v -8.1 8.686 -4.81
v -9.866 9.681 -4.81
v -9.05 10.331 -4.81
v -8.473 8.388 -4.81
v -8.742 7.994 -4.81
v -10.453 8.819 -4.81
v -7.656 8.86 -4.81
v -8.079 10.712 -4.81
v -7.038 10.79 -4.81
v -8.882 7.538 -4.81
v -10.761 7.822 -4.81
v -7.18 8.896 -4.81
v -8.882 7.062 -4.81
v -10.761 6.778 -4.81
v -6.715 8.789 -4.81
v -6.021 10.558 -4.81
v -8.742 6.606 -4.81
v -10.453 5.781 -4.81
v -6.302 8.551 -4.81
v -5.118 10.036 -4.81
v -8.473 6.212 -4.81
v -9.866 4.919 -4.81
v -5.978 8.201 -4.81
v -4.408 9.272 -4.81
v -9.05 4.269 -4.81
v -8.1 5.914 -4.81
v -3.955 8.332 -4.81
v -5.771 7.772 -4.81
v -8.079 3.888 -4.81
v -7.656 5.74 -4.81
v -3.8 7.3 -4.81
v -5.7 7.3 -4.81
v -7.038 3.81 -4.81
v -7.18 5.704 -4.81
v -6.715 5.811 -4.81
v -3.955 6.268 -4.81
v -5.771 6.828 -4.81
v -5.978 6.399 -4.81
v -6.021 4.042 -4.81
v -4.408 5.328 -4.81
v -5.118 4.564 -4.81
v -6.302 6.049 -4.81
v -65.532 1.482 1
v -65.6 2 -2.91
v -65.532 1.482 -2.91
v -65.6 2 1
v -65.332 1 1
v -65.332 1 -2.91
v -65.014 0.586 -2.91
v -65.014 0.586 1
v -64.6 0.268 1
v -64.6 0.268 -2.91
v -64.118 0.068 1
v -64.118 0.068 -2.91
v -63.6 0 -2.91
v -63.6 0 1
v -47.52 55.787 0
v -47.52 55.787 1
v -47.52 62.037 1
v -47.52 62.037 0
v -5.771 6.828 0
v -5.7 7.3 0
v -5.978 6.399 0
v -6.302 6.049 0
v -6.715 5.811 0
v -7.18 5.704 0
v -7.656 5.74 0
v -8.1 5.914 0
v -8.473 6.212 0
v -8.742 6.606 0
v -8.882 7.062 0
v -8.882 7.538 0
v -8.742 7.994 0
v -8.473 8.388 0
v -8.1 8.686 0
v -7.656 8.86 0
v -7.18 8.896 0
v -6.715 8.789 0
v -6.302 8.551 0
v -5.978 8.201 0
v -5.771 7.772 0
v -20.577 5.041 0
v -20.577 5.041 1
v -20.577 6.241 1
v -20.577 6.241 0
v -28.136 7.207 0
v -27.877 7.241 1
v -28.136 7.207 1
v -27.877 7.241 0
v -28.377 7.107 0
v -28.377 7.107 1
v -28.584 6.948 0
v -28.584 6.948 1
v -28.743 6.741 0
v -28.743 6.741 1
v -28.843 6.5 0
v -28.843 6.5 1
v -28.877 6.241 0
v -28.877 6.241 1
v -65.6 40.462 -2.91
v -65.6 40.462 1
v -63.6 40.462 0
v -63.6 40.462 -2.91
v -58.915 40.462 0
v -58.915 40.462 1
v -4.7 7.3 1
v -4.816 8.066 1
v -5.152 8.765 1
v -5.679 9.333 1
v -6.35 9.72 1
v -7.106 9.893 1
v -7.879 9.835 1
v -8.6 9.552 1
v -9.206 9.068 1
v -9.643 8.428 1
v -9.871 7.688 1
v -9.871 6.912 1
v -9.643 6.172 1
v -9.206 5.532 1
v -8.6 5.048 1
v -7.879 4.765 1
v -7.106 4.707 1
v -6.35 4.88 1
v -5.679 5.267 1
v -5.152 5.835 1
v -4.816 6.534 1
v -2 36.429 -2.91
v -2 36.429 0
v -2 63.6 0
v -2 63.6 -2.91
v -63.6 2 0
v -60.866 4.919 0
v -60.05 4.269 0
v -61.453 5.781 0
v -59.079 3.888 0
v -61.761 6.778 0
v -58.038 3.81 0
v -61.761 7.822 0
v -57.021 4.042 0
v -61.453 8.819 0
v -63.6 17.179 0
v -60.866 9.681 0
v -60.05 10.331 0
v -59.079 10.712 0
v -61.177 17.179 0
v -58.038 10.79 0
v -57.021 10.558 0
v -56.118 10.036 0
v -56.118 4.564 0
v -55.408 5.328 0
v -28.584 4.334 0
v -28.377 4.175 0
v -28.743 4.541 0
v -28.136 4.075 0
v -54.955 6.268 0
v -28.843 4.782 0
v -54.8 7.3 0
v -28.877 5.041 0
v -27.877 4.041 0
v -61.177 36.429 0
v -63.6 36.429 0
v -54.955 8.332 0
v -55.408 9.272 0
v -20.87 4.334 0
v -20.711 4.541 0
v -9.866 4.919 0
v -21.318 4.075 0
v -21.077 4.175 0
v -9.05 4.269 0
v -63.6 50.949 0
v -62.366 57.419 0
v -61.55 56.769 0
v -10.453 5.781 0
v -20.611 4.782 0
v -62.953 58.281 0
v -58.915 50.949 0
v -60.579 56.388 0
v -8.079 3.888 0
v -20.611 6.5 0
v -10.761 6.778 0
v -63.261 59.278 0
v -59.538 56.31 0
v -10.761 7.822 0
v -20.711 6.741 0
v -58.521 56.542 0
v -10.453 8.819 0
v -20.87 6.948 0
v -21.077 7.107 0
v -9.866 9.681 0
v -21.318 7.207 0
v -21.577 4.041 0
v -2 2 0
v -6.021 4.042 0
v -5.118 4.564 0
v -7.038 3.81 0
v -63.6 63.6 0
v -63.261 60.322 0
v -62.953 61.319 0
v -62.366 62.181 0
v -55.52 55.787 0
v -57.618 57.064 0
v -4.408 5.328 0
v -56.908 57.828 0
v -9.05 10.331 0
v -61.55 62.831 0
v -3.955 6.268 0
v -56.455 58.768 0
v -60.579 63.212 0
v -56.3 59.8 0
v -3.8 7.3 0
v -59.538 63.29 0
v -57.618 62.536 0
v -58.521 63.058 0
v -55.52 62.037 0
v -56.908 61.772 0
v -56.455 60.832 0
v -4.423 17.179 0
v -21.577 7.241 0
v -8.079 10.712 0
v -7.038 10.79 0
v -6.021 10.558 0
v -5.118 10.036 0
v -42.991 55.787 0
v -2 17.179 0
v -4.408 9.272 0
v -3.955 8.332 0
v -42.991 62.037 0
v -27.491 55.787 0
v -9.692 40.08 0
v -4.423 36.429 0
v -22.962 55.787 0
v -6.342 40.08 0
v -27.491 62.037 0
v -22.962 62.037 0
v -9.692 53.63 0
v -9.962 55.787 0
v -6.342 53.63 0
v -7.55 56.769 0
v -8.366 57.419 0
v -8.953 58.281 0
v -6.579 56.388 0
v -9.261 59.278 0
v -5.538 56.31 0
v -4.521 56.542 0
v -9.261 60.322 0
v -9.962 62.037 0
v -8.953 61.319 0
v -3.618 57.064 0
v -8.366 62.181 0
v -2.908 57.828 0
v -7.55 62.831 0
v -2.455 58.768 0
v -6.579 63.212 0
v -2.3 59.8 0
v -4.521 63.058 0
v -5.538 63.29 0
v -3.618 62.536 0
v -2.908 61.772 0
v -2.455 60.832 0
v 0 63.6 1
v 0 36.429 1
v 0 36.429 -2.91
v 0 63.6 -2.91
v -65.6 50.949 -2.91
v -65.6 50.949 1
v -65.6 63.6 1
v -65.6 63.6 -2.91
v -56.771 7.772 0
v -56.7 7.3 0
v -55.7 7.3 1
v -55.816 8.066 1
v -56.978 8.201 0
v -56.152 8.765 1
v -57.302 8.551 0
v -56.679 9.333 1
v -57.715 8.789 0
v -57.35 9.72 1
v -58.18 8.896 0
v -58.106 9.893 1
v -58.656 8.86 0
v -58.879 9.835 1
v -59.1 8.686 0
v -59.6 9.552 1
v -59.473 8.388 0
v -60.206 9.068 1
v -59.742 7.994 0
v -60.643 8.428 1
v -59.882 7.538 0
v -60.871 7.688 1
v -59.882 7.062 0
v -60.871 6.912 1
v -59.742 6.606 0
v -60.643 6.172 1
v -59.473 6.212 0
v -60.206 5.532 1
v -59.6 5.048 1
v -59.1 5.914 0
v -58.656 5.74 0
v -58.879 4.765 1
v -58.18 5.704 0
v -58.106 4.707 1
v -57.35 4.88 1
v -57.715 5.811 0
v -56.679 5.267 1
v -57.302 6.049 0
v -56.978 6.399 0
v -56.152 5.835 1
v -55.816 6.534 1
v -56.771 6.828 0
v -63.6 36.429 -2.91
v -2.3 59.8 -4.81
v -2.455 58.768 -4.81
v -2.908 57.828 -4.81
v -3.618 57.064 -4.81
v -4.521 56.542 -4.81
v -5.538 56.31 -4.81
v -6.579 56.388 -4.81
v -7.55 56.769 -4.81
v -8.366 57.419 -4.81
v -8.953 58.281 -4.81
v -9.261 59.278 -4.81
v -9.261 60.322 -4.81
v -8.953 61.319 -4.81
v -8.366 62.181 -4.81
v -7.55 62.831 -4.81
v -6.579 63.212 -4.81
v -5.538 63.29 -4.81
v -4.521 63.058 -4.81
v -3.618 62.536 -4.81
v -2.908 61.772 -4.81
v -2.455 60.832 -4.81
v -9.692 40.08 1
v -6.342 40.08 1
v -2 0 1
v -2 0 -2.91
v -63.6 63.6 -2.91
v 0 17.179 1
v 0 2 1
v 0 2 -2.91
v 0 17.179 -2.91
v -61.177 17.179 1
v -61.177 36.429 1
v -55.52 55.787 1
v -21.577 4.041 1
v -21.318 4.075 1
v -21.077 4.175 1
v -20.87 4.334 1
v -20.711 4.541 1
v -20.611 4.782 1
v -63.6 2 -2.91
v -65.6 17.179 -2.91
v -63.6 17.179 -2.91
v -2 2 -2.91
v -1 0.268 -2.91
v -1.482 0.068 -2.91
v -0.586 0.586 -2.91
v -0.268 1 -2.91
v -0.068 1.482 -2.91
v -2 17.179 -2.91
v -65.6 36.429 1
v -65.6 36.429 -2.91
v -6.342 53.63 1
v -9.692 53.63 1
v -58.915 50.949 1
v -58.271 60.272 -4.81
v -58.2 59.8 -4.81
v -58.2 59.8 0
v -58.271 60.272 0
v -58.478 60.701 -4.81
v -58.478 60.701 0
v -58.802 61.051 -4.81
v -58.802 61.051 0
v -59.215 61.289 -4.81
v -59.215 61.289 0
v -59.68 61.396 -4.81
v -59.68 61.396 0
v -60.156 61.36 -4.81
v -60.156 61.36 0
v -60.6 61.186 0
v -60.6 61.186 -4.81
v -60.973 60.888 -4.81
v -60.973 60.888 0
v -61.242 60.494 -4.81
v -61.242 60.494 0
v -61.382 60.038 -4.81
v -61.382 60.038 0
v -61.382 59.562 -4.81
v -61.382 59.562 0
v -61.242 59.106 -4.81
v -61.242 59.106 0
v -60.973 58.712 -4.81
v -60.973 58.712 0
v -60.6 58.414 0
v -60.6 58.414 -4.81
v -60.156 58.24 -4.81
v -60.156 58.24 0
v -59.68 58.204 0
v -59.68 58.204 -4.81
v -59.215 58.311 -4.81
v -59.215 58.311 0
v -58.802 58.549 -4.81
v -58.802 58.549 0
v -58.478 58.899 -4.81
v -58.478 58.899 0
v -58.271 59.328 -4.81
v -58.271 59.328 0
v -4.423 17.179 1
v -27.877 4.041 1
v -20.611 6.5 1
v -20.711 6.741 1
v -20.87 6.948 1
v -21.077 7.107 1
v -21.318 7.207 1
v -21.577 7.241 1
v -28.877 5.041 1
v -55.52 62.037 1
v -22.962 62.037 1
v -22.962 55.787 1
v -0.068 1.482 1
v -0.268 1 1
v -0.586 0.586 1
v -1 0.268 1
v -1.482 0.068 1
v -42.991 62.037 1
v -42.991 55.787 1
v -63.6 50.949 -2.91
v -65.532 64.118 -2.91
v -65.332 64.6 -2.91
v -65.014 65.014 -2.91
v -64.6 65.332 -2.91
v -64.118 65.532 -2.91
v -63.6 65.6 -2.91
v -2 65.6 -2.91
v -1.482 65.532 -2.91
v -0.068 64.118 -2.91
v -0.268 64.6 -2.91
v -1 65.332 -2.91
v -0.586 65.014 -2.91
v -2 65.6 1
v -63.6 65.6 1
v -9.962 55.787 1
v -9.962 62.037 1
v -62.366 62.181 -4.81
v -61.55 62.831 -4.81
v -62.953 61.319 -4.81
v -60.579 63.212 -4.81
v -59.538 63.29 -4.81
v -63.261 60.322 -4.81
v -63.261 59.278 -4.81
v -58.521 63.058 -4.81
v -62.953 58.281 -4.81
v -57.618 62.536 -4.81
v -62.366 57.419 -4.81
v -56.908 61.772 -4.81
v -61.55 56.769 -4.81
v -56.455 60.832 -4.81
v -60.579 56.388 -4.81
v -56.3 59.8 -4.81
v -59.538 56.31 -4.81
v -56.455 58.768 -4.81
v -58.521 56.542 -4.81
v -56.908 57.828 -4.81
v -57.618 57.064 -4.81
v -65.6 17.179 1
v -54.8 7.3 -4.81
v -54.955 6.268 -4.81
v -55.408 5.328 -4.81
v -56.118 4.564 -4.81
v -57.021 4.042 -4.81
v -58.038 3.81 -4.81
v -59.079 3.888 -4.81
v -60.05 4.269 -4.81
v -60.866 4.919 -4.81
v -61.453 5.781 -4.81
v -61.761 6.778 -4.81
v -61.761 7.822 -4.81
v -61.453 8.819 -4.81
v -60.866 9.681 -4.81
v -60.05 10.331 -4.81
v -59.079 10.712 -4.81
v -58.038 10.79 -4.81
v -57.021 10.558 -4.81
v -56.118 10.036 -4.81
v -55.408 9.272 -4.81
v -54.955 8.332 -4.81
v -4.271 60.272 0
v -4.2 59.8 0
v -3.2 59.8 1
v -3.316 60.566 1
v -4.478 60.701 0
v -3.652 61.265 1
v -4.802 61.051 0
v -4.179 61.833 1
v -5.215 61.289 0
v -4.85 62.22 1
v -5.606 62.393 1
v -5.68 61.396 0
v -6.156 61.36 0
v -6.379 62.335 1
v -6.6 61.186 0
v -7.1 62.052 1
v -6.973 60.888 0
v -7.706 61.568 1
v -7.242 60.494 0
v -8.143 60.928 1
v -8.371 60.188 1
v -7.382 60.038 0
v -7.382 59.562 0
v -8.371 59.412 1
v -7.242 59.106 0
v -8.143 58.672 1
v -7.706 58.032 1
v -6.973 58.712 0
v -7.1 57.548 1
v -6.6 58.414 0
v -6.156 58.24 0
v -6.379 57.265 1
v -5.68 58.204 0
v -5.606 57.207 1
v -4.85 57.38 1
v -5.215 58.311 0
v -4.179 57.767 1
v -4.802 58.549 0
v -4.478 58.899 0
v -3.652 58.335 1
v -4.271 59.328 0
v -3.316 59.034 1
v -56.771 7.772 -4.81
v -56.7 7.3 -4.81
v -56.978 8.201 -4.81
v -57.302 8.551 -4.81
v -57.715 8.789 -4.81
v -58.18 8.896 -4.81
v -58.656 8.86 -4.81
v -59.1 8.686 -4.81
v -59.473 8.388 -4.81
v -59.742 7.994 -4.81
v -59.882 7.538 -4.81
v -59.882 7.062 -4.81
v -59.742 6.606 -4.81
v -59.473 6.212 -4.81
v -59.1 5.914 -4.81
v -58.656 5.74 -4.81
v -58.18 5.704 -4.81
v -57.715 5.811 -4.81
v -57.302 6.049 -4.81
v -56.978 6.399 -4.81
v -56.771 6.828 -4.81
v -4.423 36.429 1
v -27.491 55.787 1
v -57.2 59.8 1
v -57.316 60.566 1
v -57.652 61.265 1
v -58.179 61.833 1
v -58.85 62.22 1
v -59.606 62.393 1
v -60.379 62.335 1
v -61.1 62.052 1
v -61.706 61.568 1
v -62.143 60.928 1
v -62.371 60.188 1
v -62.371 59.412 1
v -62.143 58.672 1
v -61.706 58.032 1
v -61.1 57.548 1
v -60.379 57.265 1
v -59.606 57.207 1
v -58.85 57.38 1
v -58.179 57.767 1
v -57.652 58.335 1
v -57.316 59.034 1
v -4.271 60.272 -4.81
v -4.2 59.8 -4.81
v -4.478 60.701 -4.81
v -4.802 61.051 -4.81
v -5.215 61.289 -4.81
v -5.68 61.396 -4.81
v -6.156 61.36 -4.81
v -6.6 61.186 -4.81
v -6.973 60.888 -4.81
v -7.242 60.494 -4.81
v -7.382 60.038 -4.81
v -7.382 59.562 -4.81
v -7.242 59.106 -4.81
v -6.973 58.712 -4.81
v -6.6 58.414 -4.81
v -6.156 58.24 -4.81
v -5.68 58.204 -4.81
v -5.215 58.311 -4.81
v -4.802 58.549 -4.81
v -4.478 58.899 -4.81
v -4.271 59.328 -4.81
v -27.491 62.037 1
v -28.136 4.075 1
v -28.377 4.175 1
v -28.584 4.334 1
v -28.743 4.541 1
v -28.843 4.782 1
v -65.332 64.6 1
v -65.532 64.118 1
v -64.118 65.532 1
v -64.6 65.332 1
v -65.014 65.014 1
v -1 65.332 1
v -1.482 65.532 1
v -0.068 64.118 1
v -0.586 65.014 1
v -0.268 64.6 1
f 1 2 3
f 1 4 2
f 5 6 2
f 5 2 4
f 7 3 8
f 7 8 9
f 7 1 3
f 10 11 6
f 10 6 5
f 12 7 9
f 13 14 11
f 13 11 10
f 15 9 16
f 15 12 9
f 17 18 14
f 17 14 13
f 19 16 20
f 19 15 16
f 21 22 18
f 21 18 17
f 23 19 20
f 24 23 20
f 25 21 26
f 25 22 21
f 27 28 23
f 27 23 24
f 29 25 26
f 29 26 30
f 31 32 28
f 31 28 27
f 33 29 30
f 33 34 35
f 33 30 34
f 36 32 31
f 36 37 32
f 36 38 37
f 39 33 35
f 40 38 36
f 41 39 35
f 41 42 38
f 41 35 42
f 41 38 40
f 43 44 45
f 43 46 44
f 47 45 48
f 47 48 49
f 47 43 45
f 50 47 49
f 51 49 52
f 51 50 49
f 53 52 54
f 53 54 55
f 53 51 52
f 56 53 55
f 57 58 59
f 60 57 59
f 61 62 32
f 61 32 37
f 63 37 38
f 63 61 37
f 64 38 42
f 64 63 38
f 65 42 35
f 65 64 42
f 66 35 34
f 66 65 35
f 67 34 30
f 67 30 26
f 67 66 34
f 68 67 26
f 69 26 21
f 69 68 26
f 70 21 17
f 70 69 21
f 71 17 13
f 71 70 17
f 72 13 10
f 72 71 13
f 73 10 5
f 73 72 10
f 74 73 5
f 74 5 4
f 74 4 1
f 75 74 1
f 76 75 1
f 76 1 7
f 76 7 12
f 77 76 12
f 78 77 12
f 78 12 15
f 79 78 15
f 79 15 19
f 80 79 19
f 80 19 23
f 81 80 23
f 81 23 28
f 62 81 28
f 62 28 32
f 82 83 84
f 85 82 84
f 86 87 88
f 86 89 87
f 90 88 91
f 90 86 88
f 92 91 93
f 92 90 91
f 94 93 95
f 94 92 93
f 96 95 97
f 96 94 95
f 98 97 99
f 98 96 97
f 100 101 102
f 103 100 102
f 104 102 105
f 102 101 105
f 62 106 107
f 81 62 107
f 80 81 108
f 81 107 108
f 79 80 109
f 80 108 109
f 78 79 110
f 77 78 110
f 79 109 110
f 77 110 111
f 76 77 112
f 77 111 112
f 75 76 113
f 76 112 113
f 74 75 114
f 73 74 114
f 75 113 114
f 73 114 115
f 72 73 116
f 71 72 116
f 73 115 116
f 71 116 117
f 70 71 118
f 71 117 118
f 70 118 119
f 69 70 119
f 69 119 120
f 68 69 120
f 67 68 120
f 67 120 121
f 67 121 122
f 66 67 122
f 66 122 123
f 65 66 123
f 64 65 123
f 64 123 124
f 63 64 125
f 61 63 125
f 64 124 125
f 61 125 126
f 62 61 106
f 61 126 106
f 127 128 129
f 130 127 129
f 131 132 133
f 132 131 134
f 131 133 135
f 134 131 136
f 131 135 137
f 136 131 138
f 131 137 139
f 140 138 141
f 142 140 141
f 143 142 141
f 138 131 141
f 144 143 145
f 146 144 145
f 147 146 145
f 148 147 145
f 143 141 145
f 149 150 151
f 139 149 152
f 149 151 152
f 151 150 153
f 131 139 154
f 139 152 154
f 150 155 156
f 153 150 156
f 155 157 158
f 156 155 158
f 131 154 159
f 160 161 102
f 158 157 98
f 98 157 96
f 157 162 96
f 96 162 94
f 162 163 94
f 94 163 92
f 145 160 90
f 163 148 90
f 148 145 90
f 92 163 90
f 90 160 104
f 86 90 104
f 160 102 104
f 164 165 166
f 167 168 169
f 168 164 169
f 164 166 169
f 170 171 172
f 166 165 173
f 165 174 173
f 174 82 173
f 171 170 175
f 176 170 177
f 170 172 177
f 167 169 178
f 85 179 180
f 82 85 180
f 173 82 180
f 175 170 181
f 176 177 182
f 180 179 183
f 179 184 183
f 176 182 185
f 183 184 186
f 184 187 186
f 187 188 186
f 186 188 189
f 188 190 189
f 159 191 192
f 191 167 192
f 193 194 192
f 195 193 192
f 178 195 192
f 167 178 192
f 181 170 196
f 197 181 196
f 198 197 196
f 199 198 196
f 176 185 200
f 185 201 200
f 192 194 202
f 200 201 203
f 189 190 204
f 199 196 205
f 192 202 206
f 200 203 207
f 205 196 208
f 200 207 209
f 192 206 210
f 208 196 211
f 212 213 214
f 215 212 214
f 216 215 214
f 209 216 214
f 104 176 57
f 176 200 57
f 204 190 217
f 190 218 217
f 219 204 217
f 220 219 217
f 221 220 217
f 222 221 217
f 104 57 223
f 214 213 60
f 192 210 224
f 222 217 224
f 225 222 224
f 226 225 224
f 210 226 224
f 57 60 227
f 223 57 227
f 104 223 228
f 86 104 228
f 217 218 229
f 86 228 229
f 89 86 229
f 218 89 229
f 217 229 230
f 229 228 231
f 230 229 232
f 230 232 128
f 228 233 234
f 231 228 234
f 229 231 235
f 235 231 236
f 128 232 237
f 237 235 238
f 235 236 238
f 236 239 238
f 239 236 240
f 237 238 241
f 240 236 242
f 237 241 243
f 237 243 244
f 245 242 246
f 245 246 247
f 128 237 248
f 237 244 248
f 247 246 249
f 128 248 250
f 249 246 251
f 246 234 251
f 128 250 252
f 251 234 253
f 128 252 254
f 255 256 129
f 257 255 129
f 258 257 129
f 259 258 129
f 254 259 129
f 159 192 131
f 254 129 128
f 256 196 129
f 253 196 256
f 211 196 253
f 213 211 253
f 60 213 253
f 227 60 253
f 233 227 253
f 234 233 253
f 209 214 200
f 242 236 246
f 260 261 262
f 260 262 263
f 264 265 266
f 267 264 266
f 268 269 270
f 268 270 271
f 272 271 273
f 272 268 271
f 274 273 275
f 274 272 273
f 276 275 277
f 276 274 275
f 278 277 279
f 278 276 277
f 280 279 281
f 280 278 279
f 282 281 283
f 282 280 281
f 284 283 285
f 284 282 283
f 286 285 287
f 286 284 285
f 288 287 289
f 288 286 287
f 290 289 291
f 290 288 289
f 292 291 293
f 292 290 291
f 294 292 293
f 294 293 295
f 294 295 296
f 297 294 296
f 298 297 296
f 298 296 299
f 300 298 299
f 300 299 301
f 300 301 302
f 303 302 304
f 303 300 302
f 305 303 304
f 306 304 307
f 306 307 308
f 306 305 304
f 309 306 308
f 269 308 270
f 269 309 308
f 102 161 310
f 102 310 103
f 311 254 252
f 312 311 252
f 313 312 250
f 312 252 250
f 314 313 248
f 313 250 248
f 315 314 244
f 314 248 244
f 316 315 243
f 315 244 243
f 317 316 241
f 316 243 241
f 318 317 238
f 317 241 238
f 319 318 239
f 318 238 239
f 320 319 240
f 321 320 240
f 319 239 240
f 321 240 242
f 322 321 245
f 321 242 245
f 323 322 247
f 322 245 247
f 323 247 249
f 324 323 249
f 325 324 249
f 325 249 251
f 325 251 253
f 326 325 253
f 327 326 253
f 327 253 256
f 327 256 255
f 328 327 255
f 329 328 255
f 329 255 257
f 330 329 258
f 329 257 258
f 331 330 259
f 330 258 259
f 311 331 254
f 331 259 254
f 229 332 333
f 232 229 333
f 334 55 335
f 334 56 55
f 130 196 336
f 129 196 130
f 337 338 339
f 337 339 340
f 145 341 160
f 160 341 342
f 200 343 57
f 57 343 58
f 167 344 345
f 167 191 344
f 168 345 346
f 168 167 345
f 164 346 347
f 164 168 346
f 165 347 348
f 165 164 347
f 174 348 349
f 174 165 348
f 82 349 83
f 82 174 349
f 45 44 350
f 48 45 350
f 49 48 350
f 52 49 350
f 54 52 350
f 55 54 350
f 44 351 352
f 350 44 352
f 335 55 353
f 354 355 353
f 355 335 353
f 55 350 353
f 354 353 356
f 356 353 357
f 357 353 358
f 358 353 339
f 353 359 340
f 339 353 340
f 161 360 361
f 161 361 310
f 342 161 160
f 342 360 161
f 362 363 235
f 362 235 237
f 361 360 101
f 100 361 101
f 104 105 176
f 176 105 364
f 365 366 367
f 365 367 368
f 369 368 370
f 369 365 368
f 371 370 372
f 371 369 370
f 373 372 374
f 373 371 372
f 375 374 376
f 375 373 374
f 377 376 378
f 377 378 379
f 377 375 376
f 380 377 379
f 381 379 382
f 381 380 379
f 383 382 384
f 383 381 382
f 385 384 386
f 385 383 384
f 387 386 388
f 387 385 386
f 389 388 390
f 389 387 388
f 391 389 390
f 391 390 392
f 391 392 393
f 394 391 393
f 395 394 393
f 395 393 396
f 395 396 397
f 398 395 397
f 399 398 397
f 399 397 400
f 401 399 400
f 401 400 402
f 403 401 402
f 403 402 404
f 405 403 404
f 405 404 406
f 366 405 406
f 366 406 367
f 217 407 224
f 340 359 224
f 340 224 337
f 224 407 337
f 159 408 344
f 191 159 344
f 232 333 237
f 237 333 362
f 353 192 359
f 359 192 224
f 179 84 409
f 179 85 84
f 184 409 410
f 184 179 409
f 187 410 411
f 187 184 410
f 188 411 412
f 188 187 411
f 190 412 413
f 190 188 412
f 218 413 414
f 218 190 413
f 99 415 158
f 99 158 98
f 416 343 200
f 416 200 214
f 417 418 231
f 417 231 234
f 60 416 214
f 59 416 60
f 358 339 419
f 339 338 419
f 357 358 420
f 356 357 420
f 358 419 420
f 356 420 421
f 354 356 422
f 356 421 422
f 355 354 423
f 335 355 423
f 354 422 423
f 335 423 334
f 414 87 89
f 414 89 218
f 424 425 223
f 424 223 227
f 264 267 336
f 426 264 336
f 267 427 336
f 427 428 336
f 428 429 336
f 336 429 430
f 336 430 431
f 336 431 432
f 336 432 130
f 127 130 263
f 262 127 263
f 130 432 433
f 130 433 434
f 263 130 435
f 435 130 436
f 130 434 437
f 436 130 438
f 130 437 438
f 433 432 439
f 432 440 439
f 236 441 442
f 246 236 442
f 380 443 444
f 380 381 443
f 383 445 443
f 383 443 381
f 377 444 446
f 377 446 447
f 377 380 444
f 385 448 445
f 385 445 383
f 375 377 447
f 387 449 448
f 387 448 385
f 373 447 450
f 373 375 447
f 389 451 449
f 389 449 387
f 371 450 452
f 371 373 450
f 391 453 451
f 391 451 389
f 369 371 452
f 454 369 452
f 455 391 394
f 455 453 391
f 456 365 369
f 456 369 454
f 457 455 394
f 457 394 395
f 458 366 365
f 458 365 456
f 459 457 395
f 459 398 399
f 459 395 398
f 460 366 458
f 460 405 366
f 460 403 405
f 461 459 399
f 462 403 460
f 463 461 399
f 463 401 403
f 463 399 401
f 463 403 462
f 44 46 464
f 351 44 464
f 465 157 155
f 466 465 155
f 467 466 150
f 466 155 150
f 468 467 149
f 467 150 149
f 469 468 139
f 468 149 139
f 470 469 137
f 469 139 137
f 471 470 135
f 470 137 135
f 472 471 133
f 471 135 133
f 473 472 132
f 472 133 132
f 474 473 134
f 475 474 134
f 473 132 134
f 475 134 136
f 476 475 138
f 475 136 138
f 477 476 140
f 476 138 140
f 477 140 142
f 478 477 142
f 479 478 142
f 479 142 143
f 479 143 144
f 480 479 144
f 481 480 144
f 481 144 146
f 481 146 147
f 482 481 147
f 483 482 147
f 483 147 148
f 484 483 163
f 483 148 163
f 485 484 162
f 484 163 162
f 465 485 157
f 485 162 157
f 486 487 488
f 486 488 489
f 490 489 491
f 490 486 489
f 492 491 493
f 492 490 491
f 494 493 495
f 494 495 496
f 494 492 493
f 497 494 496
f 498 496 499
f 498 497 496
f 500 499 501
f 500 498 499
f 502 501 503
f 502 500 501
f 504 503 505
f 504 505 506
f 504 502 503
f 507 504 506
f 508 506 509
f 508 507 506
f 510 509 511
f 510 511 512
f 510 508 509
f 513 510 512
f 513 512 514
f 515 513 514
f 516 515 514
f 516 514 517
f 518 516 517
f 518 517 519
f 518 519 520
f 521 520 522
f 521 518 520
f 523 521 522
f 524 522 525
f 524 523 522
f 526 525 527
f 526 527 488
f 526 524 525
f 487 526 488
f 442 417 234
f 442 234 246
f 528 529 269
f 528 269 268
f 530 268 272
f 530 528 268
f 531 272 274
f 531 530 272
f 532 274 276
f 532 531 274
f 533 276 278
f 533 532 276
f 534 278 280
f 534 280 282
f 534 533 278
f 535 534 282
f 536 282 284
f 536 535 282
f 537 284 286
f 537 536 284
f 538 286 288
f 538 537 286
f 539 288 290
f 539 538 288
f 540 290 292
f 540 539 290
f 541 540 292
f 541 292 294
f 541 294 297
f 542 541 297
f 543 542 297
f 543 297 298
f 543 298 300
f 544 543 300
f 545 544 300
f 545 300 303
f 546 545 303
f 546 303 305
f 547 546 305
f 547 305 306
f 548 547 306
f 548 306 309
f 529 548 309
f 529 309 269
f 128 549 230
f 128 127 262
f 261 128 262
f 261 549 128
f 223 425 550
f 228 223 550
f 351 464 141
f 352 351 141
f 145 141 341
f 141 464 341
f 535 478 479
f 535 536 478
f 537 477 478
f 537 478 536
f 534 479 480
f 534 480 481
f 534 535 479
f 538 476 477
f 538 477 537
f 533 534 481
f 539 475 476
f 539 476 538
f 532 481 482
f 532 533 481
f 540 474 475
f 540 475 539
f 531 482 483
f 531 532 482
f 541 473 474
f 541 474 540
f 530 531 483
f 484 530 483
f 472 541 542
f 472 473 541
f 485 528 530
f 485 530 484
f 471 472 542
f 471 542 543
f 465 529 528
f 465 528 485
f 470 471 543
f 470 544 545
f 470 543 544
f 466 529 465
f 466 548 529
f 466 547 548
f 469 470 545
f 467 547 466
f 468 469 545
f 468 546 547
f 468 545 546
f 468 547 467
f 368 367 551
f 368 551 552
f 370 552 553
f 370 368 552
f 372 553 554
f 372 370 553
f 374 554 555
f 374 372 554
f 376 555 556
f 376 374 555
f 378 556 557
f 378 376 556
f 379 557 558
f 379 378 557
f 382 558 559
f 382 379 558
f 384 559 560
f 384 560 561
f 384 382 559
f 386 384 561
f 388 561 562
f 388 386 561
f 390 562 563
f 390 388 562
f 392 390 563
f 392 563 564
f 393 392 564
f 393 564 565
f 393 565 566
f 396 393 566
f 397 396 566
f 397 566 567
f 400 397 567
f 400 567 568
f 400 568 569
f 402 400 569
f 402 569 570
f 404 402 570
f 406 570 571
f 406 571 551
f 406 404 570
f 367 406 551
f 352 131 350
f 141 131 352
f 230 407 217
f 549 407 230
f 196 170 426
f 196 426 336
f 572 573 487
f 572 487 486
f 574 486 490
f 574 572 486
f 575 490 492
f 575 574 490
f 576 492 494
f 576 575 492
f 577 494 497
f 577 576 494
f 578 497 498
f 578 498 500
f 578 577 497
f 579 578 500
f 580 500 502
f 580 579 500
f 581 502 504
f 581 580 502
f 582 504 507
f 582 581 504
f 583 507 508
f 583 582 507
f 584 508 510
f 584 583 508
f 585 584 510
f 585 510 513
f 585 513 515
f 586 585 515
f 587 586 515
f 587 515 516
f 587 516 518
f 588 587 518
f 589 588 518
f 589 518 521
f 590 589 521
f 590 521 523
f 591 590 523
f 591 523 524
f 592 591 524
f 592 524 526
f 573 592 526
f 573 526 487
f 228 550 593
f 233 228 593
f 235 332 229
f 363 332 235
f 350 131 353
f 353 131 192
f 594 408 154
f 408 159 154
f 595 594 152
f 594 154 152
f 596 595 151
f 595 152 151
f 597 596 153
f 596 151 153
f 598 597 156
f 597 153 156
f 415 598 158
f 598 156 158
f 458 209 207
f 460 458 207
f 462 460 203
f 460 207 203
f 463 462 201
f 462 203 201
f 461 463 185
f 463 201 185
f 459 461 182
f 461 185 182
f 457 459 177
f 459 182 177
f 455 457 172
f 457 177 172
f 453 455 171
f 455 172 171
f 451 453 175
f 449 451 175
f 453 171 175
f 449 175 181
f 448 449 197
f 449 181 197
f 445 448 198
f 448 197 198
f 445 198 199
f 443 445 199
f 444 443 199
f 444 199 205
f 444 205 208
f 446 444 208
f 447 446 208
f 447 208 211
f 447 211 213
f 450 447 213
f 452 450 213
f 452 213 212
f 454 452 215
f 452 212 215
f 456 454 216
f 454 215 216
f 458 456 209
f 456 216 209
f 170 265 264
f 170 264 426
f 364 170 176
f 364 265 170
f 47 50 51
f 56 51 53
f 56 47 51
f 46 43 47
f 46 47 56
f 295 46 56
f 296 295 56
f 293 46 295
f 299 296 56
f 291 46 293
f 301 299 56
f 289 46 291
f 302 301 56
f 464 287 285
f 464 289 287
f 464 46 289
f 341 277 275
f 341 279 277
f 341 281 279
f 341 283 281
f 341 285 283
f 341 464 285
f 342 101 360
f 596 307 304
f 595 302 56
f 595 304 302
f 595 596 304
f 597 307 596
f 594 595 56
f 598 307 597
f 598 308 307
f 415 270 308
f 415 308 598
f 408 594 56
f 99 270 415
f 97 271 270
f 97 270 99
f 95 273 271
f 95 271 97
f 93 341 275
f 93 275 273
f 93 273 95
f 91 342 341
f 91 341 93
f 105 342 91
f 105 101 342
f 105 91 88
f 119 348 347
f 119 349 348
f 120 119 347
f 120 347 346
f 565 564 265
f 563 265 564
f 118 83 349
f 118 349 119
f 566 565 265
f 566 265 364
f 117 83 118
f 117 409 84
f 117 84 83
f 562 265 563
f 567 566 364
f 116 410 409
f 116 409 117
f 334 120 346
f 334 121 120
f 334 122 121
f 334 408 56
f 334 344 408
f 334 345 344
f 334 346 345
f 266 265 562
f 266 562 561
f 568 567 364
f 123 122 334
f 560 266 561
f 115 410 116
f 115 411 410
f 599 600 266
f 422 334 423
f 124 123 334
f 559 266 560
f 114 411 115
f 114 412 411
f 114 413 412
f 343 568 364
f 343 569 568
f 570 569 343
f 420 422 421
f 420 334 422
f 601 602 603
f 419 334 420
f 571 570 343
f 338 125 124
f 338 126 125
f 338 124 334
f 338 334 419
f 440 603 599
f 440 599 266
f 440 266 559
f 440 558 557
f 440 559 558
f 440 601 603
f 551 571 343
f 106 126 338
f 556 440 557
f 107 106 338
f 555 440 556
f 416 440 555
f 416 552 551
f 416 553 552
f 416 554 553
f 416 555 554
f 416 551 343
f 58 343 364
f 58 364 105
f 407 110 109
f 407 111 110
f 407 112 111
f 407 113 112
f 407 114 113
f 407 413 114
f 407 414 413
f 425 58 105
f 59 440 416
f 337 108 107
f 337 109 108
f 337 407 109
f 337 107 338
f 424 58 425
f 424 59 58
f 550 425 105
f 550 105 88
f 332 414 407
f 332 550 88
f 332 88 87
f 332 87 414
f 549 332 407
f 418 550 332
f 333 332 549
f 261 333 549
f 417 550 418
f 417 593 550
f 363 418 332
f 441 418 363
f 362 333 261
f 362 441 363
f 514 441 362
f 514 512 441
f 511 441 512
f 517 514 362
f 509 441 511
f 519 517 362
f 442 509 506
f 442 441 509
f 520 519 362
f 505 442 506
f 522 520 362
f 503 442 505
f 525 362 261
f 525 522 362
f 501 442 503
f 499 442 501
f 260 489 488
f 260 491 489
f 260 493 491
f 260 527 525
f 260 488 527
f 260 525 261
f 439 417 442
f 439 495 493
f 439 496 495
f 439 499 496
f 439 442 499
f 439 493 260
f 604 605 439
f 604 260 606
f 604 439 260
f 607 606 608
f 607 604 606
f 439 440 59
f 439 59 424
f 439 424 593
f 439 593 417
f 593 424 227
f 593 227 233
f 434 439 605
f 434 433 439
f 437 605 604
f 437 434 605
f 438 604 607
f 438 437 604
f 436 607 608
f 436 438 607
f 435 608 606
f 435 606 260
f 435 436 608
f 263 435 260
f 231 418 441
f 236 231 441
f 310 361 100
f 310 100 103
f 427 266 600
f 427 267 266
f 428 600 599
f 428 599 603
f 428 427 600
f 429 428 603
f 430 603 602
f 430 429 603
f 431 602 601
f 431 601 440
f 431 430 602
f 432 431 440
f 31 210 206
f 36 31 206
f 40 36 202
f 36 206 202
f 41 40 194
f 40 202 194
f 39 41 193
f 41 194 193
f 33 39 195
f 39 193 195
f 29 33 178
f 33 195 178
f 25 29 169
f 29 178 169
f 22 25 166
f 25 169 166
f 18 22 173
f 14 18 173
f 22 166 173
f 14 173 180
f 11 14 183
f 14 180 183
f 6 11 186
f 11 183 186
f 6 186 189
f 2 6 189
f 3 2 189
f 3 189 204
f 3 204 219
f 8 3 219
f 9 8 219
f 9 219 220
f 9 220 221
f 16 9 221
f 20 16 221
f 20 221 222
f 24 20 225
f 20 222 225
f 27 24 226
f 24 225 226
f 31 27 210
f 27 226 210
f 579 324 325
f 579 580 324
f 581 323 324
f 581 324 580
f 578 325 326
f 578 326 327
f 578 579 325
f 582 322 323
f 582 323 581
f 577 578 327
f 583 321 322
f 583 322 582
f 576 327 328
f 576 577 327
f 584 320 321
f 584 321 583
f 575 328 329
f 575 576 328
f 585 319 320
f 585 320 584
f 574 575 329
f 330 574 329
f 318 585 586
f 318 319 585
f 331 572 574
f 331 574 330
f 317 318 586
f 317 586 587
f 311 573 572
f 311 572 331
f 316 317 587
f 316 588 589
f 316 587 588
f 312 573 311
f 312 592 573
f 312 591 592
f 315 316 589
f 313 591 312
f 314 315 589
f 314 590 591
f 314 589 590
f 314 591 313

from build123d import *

# Parameters (mm, degrees)
F0_W     = 65.6
F0_H     = 65.6
F0_W_2   = 61.6
F0_H_2   = 61.6
F0_R     = 1.6
F1_DEPTH = 1
F2_DEPTH = 2.91
F3_W     = 4.423
F3_H     = 19.25
F3_W_2   = 6.685
F3_H_2   = 10.487
F3_W_3   = 8
F3_H_3   = 6.25
F3_W_4   = 15.5
F3_W_5   = 13
F3_W_6   = 8.3
F3_H_4   = 3.2
F3_W_7   = 3.35
F3_H_5   = 13.55
F4_DEPTH = 3.911
F5_R     = 1
F6_R     = 2
F7_R     = 3.5
F7_R_2   = 1.6
F8_DEPTH = 4.81
F9_SIZE  = 1


with BuildPart() as f1:
    # F0 (on Top) → F1 (new body)
    with BuildSketch(Plane.XY):
        with Locations((-32.8, 32.8)):
            Rectangle(F0_W, F0_H)
        with Locations((-32.8, 32.8)):
            Rectangle(F0_W_2, F0_H_2, mode=Mode.SUBTRACT)
        with Locations((-32.8, 32.8)):
            Rectangle(F0_W_2, F0_H_2)
        with Locations((-58.3, 7.3)):
            Circle(F0_R, mode=Mode.SUBTRACT)
        with Locations((-7.3, 7.3)):
            Circle(F0_R, mode=Mode.SUBTRACT)
        with Locations((-59.8, 59.8)):
            Circle(F0_R, mode=Mode.SUBTRACT)
        with Locations((-5.8, 59.8)):
            Circle(F0_R, mode=Mode.SUBTRACT)
    extrude(amount=F1_DEPTH)

    # F0 (on Top) → F2 (join)
    with BuildSketch(Plane.XY):
        with Locations((-32.8, 32.8)):
            Rectangle(F0_W, F0_H)
        with Locations((-32.8, 32.8)):
            Rectangle(F0_W_2, F0_H_2, mode=Mode.SUBTRACT)
    extrude(amount=-F2_DEPTH)

    # F3 (on face) → F4 (cut, through all)
    with BuildSketch(Plane.XY.offset(1)):
        with Locations((-63.3885, 26.804)):
            Rectangle(F3_W, F3_H)
        with Locations((-2.2115, 26.804)):
            Rectangle(F3_W, F3_H)
        with Locations((-62.2575, 45.7055)):
            Rectangle(F3_W_2, F3_H_2)
        with Locations((-51.52, 58.912)):
            Rectangle(F3_W_3, F3_H_3)
        with Locations((-35.241, 58.912)):
            Rectangle(F3_W_4, F3_H_3)
        with Locations((-16.462, 58.912)):
            Rectangle(F3_W_5, F3_H_3)
        with Locations((-24.727, 5.641)):
            Rectangle(F3_W_6, F3_H_4)
        with Locations((-8.017, 46.855)):
            Rectangle(F3_W_7, F3_H_5)
    extrude(amount=-F4_DEPTH, mode=Mode.SUBTRACT)

    # F5
    f5_edges = [f1.edges().sort_by_distance(p)[0] for p in [
        (-28.877, 7.241, 0.5),
        (-20.577, 4.041, 0.5),
        (-20.577, 7.241, 0.5),
        (-28.877, 4.041, 0.5),
    ]]
    fillet(f5_edges, radius=F5_R)

    # F6
    f6_edges = [f1.edges().sort_by_distance(p)[0] for p in [
        (-65.6, 0, -0.955),
        (0, 0, -0.955),
        (0, 65.6, -0.955),
        (-65.6, 65.6, -0.955),
    ]]
    fillet(f6_edges, radius=F6_R)

    # F7 (on face) → F8 (join)
    with BuildSketch(Plane(origin=(0, 0, 0), x_dir=(1, 0, 0), z_dir=(0, 0, -1))):
        with Locations((-7.3, -7.3)):
            Circle(F7_R)
        with Locations((-7.3, -7.3)):
            Circle(F7_R_2, mode=Mode.SUBTRACT)
        with Locations((-5.8, -59.8)):
            Circle(F7_R)
        with Locations((-5.8, -59.8)):
            Circle(F7_R_2, mode=Mode.SUBTRACT)
        with Locations((-59.8, -59.8)):
            Circle(F7_R)
        with Locations((-59.8, -59.8)):
            Circle(F7_R_2, mode=Mode.SUBTRACT)
        with Locations((-58.3, -7.3)):
            Circle(F7_R)
        with Locations((-58.3, -7.3)):
            Circle(F7_R_2, mode=Mode.SUBTRACT)
    extrude(amount=F8_DEPTH)

    # F9
    f9_edges = [f1.edges().sort_by_distance(p)[0] for p in [
        (-7.4, 59.8, 1),
        (-8.9, 7.3, 1),
        (-59.9, 7.3, 1),
        (-61.4, 59.8, 1),
    ]]
    chamfer(f9_edges, length=F9_SIZE)


solid = f1.part
